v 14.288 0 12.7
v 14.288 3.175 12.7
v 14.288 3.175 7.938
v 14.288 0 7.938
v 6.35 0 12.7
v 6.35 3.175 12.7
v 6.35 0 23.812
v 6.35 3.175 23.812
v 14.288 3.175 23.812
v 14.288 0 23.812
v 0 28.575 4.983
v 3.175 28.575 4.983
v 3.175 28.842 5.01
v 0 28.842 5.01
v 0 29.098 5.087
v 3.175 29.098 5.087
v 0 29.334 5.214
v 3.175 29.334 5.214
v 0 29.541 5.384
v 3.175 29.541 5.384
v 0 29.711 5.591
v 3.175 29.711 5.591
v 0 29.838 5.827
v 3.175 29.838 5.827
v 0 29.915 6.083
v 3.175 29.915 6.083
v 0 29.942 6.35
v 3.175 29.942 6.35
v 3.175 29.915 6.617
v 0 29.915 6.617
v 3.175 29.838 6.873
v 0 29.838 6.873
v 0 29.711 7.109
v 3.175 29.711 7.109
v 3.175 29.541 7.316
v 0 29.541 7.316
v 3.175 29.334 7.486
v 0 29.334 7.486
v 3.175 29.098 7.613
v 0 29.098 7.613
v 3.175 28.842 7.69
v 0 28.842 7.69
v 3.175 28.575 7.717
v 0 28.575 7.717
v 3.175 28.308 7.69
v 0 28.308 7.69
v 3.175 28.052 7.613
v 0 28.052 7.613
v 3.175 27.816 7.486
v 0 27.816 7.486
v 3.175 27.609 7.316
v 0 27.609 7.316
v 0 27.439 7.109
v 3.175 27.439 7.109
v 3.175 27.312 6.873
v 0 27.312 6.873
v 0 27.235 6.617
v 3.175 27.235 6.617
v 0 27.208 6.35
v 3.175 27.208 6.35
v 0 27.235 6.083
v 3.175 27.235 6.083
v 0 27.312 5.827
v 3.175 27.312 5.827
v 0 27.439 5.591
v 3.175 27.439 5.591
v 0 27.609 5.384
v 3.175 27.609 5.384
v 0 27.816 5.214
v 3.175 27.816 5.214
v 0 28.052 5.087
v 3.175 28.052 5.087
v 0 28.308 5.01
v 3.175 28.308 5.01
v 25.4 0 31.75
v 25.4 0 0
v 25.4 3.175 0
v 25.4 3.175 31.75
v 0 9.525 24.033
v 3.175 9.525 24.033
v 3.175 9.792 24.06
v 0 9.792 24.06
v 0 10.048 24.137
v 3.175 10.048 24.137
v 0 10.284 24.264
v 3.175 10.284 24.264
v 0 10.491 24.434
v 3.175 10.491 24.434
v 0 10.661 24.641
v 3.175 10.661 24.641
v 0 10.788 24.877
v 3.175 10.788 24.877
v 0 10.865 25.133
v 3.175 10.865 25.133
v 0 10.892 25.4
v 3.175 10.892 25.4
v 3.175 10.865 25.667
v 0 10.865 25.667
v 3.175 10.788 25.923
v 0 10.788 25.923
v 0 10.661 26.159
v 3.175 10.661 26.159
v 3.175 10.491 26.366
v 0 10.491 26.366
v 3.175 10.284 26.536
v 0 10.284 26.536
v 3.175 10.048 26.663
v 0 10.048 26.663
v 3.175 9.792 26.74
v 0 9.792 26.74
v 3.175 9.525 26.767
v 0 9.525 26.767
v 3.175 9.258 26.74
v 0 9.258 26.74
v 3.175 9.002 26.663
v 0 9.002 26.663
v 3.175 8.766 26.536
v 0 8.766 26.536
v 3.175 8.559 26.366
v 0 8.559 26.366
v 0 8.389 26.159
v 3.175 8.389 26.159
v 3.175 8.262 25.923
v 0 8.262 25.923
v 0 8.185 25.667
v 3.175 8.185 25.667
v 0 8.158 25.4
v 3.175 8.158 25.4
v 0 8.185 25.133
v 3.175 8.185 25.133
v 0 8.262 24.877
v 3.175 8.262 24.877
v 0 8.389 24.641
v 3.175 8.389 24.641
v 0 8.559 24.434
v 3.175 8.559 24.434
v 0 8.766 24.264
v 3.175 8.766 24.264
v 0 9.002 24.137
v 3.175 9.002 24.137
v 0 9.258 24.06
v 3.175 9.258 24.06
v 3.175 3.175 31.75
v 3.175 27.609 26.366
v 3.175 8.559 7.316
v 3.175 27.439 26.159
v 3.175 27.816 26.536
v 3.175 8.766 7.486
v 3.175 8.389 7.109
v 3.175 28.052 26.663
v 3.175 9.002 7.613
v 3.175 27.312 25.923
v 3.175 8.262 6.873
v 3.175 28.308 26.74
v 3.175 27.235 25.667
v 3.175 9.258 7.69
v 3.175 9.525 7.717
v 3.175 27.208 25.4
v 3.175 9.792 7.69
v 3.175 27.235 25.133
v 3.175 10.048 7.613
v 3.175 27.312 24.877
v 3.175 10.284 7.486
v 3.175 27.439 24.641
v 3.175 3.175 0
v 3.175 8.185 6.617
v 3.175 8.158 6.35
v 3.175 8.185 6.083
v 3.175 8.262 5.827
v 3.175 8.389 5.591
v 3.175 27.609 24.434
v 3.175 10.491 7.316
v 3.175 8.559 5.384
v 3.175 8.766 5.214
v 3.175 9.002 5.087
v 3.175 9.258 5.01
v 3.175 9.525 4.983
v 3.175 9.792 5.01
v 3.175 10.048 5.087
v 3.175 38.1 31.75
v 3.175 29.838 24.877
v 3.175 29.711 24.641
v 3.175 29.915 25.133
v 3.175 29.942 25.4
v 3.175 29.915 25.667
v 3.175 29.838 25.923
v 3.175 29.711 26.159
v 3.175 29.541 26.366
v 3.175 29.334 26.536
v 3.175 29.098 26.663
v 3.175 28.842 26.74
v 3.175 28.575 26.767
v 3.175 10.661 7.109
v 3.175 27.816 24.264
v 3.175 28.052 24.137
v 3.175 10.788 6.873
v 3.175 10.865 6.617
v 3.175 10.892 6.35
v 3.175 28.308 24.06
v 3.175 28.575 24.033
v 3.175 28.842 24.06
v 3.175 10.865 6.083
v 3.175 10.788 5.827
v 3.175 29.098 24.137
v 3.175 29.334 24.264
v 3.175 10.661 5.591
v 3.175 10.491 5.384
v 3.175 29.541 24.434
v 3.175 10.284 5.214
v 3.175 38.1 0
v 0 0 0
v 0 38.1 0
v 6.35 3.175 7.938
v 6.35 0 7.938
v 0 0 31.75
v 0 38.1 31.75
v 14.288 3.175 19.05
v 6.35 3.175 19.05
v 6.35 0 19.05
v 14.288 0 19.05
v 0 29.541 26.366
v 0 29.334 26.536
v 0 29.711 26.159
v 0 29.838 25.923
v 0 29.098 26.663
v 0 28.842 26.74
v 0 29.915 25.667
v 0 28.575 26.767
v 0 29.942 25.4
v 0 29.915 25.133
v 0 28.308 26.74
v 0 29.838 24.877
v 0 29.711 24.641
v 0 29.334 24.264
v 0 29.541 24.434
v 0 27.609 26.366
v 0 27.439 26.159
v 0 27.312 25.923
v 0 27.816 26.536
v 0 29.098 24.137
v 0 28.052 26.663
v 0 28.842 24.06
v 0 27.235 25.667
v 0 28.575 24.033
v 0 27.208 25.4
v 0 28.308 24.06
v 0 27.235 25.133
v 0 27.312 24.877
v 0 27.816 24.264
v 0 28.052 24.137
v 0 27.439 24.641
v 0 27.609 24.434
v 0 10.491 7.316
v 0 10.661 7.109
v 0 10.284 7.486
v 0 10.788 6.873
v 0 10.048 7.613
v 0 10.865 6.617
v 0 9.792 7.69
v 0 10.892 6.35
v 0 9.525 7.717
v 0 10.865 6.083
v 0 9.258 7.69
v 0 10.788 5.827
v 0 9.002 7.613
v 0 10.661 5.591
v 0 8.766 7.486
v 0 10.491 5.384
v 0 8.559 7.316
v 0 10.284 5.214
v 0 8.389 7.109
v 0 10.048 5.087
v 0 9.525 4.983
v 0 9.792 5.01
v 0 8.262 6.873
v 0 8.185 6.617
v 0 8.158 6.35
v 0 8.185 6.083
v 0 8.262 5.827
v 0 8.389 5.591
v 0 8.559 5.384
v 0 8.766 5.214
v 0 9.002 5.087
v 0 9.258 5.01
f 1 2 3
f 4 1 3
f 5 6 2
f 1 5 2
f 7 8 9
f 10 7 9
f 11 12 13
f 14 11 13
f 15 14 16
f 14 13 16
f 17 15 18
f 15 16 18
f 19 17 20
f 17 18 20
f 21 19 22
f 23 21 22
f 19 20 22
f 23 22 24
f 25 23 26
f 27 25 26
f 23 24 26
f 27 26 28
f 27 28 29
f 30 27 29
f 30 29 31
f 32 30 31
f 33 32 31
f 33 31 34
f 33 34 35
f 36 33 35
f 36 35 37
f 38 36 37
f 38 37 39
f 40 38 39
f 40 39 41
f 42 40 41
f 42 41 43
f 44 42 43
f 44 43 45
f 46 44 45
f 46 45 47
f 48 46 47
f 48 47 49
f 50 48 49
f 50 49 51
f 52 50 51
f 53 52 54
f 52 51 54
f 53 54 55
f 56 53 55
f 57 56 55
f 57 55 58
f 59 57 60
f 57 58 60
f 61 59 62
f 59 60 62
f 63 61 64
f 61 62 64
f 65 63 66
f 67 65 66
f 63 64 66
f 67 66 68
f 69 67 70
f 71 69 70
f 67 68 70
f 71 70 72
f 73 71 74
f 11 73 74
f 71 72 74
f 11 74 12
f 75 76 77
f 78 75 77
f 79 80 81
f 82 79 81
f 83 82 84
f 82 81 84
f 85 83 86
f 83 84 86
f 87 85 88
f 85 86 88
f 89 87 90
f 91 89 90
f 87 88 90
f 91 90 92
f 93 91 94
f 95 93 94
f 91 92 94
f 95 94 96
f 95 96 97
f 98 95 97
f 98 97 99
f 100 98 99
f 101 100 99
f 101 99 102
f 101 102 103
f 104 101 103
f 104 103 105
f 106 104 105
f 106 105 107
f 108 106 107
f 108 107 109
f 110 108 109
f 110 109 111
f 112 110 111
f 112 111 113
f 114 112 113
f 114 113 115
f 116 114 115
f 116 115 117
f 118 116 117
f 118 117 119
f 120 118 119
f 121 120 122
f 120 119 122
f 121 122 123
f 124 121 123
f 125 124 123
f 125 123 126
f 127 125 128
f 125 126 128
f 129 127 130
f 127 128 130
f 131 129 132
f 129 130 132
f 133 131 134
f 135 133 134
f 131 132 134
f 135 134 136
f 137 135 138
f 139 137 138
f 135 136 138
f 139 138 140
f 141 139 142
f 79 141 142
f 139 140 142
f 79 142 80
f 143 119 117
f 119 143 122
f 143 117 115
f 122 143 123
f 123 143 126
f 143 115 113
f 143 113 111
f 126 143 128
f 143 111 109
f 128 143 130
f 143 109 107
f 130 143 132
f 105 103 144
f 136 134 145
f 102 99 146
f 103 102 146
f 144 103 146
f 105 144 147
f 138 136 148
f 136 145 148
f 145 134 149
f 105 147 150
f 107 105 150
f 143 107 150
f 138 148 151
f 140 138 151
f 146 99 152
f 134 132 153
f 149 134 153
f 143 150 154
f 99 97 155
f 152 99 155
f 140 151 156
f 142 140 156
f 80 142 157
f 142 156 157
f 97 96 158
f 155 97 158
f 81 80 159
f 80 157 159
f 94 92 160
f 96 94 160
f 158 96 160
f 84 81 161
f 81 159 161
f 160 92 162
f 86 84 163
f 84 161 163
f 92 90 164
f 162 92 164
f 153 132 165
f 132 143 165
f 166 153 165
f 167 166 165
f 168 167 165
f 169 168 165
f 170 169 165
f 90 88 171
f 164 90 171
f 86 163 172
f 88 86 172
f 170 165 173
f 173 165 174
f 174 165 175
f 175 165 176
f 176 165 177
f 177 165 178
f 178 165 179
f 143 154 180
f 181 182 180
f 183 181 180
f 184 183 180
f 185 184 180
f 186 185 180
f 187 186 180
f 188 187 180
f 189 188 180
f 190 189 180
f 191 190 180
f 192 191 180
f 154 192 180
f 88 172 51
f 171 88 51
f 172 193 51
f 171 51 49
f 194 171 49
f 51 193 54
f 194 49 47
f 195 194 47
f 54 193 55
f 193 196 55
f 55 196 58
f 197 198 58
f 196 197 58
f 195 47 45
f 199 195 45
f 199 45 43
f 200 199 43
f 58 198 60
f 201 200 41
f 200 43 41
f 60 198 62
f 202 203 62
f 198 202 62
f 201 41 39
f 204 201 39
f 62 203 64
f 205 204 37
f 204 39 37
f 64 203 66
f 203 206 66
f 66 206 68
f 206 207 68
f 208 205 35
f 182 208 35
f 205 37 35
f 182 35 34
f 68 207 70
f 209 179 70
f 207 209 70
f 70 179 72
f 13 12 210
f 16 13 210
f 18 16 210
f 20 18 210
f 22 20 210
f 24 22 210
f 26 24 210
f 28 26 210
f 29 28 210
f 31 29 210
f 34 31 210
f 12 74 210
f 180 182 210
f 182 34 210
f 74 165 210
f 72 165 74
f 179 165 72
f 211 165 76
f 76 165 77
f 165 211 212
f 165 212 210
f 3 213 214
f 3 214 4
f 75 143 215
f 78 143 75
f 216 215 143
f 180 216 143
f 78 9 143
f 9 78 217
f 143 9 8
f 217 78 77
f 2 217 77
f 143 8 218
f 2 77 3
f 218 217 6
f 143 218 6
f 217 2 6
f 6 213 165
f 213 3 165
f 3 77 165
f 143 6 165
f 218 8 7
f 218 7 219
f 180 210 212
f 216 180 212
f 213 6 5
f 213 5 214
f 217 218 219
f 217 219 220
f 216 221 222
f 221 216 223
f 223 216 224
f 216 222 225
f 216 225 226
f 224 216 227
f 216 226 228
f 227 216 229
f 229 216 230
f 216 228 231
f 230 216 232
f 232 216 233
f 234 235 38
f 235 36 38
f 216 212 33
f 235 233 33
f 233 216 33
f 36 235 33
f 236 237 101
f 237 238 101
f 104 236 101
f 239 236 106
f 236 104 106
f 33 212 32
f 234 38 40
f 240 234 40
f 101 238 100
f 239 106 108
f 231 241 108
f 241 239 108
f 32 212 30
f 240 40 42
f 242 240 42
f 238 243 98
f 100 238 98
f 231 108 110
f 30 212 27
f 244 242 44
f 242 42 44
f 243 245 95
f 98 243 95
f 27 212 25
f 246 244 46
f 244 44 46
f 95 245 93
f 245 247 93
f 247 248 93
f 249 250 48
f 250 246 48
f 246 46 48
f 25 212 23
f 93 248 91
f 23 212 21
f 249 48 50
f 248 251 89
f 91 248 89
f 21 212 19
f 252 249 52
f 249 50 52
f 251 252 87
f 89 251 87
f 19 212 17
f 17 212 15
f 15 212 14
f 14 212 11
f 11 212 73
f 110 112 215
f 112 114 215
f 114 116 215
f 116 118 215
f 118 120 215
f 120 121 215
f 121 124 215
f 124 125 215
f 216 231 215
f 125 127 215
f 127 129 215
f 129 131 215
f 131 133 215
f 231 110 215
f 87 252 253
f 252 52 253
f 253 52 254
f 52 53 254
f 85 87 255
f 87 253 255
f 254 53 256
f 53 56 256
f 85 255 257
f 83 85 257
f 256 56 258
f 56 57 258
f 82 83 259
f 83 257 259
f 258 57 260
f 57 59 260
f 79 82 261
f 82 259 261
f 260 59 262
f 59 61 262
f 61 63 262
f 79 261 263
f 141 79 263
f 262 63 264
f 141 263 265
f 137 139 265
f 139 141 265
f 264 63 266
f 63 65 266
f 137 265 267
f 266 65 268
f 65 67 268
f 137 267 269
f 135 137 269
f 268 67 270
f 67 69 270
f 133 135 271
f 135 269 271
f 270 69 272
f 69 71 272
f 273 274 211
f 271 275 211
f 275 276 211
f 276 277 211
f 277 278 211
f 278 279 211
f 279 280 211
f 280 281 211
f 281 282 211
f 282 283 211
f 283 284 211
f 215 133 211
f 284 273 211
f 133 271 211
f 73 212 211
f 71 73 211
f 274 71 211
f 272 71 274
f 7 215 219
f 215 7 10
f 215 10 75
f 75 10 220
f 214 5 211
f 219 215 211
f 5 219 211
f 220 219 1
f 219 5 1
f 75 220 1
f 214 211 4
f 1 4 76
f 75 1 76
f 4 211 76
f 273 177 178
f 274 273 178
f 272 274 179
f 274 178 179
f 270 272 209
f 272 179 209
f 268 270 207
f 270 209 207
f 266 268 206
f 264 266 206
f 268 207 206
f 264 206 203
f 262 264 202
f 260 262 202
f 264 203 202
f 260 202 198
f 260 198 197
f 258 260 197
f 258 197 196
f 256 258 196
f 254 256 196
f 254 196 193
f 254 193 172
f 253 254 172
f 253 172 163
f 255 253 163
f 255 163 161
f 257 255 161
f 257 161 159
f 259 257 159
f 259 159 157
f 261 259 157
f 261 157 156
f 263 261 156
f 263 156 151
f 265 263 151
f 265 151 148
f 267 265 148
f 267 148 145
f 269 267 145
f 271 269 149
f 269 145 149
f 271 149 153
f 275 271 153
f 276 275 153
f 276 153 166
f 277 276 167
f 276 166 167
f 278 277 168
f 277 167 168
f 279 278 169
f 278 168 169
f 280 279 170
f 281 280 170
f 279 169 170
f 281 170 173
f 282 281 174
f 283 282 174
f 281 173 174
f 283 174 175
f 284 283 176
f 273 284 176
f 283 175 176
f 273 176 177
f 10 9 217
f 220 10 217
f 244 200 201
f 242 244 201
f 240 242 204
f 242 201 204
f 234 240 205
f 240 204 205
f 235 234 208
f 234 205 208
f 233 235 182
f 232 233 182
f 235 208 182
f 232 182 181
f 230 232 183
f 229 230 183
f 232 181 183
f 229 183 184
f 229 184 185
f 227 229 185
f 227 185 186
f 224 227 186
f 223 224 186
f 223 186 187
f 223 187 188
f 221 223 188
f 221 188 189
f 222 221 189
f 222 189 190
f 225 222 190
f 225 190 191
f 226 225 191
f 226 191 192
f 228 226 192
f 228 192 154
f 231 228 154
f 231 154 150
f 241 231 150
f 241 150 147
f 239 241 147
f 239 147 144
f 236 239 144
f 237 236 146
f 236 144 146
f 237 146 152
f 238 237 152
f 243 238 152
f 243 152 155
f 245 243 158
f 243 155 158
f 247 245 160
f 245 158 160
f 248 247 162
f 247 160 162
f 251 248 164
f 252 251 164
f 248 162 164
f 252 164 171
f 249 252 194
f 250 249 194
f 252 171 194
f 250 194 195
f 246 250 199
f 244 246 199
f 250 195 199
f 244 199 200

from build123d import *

# Parameters (mm, degrees)
BOSS_EXTRUDE1_DEPTH = 31.75
SKETCH2_R           = 1.366728635
CUT_EXTRUDE1_DEPTH  = 4.175
SKETCH4_W           = 7.9375
SKETCH4_H           = 4.7625
CUT_EXTRUDE2_DEPTH  = 4.175


with BuildPart() as part:
    # Sketch1 → Boss-Extrude1 (new body)
    with BuildSketch(Plane.XY):
        Polygon((0, 0), (25.4, 0), (25.4, 3.175), (3.175, 3.175), (3.175, 38.1), (0, 38.1), align=None)
    extrude(amount=BOSS_EXTRUDE1_DEPTH)

    # Sketch2 → Cut-Extrude1 (cut, through all)
    with BuildSketch(Plane(origin=(3.175, 0, 0), x_dir=(0, 0, -1), z_dir=(1, 0, 0))):
        with Locations((-25.4, 28.575)):
            Circle(SKETCH2_R)
        with Locations((-6.35, 28.575)):
            Circle(SKETCH2_R)
        with Locations((-25.4, 9.525)):
            Circle(SKETCH2_R)
        with Locations((-6.35, 9.525)):
            Circle(SKETCH2_R)
    extrude(amount=-CUT_EXTRUDE1_DEPTH, mode=Mode.SUBTRACT)

    # Sketch4 → Cut-Extrude2 (cut, through all)
    with BuildSketch(Plane(origin=(0, 3.175, 0), x_dir=(1, 0, 0), z_dir=(0, 1, 0))):
        with Locations((10.31875, -21.43125)):
            Rectangle(SKETCH4_W, SKETCH4_H)
        with Locations((10.31875, -10.31875)):
            Rectangle(SKETCH4_W, SKETCH4_H)
    extrude(amount=-CUT_EXTRUDE2_DEPTH, mode=Mode.SUBTRACT)


solid = part.part
